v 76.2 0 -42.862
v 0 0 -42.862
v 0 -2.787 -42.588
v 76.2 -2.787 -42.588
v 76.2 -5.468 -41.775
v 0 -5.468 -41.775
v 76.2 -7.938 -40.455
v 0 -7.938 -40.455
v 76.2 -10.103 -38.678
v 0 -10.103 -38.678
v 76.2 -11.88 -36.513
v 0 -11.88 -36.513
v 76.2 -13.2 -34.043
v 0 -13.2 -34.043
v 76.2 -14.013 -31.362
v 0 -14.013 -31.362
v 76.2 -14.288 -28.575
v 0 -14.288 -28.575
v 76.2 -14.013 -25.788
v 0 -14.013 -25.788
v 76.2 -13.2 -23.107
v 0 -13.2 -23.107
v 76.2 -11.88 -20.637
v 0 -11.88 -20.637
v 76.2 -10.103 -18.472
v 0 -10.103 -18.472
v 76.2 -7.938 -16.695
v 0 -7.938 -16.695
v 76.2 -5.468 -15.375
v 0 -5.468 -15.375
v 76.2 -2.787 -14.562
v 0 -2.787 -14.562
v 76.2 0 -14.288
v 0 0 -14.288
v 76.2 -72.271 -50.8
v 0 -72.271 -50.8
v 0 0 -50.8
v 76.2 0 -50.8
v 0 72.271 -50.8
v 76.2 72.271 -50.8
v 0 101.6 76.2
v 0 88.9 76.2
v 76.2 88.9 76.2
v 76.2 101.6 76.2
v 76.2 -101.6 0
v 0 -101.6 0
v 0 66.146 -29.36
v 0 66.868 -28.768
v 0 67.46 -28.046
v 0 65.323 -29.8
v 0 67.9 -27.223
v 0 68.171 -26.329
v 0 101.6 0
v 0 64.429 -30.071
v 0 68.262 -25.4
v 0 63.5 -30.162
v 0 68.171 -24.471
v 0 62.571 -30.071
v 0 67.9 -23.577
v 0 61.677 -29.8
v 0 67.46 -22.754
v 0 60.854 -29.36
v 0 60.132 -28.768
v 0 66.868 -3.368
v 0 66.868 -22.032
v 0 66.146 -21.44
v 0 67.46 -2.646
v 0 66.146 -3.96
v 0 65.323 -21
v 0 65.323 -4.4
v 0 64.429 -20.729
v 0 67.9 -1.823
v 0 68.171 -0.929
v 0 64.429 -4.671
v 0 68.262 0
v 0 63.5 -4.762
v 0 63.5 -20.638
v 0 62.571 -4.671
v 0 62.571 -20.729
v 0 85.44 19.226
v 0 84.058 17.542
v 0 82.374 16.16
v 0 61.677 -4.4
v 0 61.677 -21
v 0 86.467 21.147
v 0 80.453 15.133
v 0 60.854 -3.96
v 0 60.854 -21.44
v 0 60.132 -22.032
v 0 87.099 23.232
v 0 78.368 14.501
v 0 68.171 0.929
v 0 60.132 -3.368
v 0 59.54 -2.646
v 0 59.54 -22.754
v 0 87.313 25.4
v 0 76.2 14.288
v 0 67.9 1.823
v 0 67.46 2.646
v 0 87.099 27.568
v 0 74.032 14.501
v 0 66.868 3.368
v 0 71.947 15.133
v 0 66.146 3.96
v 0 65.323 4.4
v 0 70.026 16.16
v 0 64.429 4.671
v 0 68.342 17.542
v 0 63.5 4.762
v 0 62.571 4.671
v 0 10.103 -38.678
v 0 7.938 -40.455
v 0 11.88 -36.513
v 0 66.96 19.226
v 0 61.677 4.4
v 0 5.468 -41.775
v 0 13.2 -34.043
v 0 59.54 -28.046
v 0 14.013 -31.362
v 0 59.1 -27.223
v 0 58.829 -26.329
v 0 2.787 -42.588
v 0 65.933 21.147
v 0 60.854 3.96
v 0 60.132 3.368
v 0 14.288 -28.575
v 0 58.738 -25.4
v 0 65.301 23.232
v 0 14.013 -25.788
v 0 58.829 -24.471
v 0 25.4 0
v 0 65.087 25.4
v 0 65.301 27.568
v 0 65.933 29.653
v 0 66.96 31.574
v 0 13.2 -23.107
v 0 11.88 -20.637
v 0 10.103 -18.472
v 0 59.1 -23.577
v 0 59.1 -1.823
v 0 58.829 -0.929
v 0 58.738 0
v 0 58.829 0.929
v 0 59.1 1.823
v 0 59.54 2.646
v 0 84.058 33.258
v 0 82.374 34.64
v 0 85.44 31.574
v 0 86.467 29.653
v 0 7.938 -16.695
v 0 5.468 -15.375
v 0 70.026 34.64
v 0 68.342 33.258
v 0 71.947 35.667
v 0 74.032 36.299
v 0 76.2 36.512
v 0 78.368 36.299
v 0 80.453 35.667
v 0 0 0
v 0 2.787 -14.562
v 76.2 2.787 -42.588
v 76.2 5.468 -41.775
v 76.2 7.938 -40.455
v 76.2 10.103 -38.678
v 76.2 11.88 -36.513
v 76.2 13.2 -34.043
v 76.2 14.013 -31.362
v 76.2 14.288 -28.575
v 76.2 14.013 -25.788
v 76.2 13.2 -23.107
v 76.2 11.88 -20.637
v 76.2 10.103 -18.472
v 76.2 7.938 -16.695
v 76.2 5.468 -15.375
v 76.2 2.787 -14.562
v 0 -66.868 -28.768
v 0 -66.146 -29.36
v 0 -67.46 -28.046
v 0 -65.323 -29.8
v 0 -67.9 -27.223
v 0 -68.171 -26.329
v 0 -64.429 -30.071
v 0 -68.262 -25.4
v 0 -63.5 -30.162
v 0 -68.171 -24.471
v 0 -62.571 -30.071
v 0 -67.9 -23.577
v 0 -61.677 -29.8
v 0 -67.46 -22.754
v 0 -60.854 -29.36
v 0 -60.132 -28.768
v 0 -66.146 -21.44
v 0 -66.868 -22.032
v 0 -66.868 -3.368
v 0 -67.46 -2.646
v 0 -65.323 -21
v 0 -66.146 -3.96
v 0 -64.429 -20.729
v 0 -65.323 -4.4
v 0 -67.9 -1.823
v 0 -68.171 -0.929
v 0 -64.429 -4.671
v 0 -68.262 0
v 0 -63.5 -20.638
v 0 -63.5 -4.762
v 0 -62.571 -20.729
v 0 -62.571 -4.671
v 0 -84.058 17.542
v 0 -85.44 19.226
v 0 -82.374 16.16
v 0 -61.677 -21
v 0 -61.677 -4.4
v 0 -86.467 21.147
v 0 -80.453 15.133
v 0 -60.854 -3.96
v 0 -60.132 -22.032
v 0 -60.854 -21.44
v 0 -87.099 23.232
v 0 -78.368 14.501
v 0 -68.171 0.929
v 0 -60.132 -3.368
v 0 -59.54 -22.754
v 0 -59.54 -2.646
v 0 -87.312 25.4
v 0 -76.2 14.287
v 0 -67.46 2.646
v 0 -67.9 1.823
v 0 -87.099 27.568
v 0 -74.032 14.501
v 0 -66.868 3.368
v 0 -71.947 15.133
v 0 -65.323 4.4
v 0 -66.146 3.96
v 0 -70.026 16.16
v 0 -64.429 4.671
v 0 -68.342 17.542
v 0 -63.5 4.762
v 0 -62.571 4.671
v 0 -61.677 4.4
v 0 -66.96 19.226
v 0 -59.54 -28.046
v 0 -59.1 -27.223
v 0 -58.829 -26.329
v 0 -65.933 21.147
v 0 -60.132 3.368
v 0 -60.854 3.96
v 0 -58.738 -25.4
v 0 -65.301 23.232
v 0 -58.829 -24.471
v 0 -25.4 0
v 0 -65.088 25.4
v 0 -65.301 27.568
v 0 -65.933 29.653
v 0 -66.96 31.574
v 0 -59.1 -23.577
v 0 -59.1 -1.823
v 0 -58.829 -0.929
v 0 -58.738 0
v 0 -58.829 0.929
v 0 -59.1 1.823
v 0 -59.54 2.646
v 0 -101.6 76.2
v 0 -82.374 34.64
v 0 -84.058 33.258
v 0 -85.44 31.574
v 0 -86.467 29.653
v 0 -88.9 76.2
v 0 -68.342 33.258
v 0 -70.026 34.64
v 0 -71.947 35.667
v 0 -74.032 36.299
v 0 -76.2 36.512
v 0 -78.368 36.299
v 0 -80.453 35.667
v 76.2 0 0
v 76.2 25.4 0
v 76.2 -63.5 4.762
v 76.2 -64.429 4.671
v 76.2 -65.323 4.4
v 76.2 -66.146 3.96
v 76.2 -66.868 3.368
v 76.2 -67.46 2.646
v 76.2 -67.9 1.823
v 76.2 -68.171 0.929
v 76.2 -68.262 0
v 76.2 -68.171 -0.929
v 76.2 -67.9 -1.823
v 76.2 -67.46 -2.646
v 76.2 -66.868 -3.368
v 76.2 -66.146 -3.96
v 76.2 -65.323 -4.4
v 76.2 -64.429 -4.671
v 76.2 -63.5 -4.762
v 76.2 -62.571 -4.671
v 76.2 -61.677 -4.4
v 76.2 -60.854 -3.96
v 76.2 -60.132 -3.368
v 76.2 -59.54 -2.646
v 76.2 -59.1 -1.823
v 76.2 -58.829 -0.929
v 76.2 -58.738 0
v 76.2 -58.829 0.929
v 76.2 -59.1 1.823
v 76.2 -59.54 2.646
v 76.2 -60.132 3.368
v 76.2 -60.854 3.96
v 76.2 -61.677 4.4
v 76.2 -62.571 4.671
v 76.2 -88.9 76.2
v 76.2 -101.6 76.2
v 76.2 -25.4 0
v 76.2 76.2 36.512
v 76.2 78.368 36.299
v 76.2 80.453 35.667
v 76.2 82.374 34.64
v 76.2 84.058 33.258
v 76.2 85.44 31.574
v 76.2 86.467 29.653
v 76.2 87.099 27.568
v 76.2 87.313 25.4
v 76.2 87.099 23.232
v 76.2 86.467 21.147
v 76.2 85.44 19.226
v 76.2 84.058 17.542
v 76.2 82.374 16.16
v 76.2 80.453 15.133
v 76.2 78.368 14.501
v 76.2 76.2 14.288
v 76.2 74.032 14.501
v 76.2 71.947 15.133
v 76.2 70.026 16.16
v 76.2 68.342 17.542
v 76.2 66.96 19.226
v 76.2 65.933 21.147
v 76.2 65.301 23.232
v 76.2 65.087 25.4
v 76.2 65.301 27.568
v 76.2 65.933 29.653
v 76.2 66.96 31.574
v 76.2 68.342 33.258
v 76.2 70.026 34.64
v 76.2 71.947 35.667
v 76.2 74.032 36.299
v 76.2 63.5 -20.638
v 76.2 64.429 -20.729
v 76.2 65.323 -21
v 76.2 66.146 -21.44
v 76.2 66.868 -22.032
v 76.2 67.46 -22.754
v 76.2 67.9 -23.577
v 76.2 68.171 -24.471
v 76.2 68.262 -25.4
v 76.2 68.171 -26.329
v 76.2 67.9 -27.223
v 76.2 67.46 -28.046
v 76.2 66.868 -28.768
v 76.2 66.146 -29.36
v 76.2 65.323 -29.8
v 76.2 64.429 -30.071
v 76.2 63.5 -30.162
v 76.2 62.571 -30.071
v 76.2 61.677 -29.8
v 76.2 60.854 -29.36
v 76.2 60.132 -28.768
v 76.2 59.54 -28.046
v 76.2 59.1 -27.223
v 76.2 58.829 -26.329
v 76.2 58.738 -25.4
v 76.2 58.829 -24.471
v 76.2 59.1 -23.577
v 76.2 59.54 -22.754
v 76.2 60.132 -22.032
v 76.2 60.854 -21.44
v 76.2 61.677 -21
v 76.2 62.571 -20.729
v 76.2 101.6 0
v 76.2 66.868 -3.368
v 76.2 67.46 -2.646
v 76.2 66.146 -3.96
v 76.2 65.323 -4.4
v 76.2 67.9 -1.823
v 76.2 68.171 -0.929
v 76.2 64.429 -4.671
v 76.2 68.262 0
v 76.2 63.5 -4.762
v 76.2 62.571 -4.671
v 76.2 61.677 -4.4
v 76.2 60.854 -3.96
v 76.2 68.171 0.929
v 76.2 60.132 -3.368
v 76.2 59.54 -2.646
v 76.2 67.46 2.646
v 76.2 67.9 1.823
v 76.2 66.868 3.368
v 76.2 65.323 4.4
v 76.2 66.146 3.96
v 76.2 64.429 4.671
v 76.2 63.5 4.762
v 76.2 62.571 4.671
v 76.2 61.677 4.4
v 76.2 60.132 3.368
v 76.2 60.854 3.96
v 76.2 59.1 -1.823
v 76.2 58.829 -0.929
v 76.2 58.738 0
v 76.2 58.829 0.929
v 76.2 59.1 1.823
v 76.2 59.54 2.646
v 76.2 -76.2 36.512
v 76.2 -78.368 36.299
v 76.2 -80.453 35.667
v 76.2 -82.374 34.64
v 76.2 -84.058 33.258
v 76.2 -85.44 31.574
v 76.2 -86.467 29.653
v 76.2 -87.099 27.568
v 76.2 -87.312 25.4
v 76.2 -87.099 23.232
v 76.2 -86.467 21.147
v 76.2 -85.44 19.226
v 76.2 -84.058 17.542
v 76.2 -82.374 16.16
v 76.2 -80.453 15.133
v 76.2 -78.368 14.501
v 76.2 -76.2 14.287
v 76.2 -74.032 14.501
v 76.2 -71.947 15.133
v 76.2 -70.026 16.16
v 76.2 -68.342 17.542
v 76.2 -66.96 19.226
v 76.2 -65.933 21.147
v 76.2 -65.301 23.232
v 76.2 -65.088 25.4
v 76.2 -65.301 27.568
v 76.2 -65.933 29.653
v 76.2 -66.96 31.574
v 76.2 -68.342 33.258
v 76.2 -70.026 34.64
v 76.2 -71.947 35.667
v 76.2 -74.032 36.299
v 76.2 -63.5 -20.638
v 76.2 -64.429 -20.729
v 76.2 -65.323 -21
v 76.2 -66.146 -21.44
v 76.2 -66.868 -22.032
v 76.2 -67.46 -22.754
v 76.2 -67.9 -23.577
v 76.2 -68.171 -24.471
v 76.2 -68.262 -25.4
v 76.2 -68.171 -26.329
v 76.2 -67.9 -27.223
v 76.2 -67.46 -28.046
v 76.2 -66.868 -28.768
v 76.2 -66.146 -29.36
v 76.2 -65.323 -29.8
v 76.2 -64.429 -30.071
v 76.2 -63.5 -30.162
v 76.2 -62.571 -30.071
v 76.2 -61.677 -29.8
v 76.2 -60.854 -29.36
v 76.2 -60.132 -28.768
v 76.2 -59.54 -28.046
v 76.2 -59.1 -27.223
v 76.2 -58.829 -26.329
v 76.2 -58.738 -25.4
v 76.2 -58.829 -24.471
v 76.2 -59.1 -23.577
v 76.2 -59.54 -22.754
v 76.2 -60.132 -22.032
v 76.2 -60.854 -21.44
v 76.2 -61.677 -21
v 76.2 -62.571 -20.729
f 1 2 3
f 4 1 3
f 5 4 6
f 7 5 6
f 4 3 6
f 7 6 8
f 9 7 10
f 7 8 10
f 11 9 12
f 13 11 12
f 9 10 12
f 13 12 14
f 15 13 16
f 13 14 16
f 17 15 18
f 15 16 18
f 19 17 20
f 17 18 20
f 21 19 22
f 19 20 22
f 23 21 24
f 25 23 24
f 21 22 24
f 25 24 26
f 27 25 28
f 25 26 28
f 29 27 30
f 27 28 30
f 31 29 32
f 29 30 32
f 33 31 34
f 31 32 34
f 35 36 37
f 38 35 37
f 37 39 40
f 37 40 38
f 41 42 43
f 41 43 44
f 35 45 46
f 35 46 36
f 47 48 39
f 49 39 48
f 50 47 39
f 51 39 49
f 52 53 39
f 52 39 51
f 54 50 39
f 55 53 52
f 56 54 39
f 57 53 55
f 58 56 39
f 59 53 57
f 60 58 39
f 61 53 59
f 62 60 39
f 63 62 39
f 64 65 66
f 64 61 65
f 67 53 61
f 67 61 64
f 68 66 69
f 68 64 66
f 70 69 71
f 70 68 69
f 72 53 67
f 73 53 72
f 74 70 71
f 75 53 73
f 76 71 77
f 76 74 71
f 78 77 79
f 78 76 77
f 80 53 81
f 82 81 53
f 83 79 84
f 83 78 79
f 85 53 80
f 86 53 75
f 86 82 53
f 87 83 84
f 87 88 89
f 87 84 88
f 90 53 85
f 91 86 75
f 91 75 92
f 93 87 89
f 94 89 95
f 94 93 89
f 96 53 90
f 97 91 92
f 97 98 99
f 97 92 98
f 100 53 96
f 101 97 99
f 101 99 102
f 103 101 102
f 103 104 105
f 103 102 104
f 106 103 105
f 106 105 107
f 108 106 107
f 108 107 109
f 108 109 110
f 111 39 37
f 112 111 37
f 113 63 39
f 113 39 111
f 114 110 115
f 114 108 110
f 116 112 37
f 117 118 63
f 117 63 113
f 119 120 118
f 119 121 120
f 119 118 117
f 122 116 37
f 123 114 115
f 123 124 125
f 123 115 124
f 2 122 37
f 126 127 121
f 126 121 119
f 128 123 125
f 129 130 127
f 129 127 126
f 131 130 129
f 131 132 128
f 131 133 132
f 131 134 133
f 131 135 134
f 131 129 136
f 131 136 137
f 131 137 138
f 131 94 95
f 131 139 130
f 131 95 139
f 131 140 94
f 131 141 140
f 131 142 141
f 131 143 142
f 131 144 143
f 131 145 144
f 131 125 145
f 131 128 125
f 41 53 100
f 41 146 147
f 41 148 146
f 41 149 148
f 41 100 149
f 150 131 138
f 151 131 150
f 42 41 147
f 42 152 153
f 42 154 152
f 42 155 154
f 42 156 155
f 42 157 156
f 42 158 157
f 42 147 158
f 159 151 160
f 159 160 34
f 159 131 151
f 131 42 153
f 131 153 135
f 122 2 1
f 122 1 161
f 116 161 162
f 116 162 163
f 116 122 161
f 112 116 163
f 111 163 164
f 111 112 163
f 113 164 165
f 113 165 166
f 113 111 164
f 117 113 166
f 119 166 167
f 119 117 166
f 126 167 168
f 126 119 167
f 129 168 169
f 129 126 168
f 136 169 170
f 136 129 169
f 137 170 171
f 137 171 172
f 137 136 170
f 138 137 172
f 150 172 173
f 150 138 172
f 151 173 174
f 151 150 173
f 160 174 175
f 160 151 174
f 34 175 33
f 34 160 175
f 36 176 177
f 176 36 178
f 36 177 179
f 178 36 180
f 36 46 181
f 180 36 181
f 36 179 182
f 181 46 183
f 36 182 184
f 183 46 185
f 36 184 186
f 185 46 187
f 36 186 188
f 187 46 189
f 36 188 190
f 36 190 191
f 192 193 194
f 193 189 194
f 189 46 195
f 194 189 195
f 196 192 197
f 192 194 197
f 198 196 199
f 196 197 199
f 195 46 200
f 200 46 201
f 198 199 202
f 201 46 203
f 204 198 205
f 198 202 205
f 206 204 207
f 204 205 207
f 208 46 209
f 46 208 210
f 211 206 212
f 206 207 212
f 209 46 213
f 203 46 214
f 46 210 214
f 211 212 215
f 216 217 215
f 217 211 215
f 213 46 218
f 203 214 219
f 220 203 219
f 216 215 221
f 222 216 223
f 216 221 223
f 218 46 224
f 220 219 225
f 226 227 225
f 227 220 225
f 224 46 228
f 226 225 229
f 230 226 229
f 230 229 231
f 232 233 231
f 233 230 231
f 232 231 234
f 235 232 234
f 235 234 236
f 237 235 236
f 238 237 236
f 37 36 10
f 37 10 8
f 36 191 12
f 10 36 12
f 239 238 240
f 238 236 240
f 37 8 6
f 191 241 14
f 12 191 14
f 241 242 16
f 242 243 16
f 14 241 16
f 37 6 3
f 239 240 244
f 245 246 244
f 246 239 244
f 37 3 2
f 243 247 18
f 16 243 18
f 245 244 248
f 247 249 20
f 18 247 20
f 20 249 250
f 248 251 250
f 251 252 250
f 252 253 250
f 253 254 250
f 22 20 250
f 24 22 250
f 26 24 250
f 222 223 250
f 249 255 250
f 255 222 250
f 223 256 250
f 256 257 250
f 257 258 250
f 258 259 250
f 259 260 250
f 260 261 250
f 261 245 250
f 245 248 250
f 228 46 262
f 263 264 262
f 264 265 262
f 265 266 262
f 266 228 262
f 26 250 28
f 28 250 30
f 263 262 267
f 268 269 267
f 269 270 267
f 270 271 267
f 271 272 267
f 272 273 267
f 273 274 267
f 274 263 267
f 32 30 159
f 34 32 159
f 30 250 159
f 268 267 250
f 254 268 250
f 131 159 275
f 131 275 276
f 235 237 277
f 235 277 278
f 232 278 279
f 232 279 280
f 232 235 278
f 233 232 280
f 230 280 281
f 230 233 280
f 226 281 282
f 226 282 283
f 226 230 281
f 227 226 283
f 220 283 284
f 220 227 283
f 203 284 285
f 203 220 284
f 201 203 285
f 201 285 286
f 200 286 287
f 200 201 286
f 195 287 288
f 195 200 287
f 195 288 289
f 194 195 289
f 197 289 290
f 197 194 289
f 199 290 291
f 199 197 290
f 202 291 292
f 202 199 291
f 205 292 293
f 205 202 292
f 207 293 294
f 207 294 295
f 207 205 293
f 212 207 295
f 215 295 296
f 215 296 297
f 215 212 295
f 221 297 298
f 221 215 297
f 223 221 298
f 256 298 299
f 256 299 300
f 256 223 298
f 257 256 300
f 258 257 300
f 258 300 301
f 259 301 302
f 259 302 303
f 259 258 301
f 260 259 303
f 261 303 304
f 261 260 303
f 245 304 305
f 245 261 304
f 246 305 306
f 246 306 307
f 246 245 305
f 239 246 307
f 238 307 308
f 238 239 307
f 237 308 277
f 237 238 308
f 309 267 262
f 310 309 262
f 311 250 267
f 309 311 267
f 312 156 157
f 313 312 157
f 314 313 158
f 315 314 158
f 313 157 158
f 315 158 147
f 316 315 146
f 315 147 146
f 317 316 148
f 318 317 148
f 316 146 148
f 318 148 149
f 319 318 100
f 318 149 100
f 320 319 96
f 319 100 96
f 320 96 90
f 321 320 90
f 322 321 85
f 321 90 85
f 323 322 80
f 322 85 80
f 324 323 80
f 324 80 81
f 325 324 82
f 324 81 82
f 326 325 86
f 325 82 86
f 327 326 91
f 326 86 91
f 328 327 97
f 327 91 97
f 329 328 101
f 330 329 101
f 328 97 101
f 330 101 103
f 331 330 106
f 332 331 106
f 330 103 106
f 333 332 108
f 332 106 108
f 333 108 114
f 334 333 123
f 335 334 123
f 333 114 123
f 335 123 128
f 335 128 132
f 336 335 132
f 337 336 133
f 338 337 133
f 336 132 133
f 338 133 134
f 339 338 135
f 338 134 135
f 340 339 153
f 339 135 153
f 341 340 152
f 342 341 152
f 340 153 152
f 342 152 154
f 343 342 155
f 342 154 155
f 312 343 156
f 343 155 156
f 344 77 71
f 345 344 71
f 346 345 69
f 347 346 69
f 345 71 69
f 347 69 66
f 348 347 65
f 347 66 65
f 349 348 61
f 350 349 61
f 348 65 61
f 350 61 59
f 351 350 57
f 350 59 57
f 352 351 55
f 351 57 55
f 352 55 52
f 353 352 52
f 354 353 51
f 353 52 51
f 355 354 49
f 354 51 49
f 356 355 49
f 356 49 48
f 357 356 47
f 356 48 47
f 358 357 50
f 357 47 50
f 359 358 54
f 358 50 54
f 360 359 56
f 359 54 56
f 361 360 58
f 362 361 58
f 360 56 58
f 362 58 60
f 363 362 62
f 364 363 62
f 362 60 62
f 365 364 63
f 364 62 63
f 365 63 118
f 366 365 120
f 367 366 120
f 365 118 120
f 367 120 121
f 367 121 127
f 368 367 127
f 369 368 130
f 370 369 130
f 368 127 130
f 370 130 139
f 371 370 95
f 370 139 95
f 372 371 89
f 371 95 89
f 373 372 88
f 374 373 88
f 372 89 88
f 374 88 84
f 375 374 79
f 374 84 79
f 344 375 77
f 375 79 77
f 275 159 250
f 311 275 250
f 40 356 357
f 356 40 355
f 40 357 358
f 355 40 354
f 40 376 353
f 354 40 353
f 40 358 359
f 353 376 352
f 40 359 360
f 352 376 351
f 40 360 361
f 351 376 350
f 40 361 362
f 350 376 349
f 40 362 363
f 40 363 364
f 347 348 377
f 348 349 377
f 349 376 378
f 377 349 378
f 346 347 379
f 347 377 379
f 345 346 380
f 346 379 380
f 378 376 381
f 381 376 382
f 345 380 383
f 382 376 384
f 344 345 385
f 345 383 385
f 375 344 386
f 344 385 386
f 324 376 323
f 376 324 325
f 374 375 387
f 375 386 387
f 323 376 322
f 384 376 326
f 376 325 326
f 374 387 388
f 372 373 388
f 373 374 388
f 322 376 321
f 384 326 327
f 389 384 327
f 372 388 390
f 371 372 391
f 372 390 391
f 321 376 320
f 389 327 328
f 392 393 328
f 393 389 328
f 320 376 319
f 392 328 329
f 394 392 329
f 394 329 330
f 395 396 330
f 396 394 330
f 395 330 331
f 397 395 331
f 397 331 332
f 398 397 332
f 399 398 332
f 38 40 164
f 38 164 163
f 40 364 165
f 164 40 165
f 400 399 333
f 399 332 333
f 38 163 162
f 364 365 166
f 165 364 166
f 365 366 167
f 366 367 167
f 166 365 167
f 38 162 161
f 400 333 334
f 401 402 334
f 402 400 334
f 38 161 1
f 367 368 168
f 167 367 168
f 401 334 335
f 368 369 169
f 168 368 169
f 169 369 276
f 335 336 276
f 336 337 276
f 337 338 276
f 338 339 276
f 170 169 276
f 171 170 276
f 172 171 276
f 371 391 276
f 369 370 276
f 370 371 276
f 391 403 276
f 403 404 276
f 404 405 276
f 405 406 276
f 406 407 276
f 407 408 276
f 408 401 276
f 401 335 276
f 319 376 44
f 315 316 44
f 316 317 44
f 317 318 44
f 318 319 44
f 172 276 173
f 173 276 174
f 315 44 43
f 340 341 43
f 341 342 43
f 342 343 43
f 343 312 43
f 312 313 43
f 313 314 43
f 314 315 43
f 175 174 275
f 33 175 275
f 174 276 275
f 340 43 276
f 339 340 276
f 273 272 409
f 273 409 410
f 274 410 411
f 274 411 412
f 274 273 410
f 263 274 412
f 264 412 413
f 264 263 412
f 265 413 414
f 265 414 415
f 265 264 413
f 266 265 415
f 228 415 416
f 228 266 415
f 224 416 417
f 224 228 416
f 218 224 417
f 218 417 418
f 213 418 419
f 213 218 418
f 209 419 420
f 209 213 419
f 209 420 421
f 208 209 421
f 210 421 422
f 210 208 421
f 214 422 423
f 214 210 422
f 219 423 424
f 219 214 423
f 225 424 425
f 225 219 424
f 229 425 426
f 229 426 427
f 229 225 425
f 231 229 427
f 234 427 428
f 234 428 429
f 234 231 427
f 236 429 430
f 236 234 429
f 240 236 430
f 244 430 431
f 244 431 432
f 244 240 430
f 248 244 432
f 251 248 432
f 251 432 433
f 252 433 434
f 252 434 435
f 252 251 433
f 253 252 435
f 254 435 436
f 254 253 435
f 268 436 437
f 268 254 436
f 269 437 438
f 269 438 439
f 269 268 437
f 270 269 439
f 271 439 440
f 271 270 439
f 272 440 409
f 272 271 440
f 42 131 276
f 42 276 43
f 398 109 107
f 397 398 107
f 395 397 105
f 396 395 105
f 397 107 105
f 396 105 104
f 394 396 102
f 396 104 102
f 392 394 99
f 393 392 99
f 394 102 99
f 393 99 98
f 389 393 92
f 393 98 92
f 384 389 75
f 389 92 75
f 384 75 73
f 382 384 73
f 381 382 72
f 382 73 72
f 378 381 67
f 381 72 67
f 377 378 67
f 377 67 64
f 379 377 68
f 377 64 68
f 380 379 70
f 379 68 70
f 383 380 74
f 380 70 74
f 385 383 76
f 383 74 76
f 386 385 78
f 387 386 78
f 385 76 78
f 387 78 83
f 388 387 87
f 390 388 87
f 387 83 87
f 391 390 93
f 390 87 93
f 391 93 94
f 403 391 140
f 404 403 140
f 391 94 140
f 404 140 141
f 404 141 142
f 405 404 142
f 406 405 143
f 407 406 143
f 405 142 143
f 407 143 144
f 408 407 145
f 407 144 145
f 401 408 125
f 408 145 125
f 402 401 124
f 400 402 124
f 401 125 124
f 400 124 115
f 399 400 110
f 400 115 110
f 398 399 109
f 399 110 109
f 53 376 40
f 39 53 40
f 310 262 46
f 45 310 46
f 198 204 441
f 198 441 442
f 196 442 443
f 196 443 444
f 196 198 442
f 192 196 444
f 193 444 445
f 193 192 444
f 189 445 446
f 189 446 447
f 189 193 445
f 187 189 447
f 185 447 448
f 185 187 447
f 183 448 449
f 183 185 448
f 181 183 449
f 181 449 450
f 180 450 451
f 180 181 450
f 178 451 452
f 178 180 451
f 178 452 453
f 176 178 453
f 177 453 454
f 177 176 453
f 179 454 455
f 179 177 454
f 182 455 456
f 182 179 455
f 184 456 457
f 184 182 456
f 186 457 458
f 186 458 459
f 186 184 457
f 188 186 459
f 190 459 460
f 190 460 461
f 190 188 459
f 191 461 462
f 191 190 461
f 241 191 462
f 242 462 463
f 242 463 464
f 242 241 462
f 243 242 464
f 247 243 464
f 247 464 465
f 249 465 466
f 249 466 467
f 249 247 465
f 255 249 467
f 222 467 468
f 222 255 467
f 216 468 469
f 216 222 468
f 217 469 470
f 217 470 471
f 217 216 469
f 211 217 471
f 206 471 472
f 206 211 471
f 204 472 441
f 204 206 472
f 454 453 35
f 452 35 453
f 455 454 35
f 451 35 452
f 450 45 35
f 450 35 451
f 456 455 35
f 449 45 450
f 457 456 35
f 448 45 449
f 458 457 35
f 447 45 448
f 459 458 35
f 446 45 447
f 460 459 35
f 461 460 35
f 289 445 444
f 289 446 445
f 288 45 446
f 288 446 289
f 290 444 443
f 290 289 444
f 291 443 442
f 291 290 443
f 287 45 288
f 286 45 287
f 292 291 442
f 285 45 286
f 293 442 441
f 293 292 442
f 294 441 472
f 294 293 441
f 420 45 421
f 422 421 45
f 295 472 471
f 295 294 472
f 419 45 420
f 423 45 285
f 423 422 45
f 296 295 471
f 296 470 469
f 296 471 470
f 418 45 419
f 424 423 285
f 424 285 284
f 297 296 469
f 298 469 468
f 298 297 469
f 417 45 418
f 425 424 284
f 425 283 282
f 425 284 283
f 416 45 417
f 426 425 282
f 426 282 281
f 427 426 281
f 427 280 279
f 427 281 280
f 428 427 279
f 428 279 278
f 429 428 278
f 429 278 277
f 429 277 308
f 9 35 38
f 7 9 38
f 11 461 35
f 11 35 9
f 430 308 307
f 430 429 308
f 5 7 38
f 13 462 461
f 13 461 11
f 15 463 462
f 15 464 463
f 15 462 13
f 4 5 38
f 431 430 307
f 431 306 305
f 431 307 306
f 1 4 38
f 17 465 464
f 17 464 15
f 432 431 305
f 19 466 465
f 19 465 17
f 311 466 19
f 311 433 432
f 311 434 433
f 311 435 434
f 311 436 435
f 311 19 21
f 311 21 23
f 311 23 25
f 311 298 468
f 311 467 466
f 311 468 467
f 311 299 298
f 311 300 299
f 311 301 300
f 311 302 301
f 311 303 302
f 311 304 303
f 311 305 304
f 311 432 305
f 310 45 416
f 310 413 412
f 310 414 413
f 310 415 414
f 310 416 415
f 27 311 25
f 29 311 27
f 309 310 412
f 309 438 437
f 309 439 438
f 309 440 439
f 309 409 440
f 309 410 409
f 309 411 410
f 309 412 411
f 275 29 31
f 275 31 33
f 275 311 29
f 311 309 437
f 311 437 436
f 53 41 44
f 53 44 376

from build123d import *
from build123d.topology import SkipClean

# Parameters (mm, degrees)
SKETCH1_R           = 4.7625
SKETCH1_R_2         = 11.1125
BOSS_EXTRUDE3_DEPTH = 76.2


with BuildPart() as part:
    # Sketch1 → Boss-Extrude3 (new body)
    with BuildSketch(Plane.YZ):
        with BuildLine():
            Line((0, -14.2875), (0, 0))
            Line((0, 0), (-25.4, 0))
            Line((-25.4, 0), (-88.9, 76.2))
            Line((-88.9, 76.2), (-101.6, 76.2))
            Line((-101.6, 76.2), (-101.6, 0))
            Line((-101.6, 0), (-72.270606325, -50.8))
            Line((-72.270606325, -50.8), (0, -50.8))
            Line((0, -50.8), (0, -42.8625))
            ThreePointArc((0, -42.8625), (-14.2875, -28.575), (0, -14.2875))
        make_face()
        with Locations(Location((-63.5, -25.4, 0), (0, 0, 90))):
            Circle(SKETCH1_R, mode=Mode.SUBTRACT)
        with Locations(Location((-63.5, 0, 0), (0, 0, 90))):
            Circle(SKETCH1_R, mode=Mode.SUBTRACT)
        with Locations(Location((-76.2, 25.4, 0), (0, 0, 90))):
            Circle(SKETCH1_R_2, mode=Mode.SUBTRACT)
    extrude(amount=BOSS_EXTRUDE3_DEPTH)

    # Mirror1: part across plane


with BuildPart() as part_1:
    with SkipClean():  # the faces are left unmerged after this step: merging them gives an invalid solid
        add(part.part)
        add(part.part.mirror(Plane(origin=(76.2, 0, 0), x_dir=(0, 0, 1), z_dir=(0, -1, 0))))


solid = part_1.part
